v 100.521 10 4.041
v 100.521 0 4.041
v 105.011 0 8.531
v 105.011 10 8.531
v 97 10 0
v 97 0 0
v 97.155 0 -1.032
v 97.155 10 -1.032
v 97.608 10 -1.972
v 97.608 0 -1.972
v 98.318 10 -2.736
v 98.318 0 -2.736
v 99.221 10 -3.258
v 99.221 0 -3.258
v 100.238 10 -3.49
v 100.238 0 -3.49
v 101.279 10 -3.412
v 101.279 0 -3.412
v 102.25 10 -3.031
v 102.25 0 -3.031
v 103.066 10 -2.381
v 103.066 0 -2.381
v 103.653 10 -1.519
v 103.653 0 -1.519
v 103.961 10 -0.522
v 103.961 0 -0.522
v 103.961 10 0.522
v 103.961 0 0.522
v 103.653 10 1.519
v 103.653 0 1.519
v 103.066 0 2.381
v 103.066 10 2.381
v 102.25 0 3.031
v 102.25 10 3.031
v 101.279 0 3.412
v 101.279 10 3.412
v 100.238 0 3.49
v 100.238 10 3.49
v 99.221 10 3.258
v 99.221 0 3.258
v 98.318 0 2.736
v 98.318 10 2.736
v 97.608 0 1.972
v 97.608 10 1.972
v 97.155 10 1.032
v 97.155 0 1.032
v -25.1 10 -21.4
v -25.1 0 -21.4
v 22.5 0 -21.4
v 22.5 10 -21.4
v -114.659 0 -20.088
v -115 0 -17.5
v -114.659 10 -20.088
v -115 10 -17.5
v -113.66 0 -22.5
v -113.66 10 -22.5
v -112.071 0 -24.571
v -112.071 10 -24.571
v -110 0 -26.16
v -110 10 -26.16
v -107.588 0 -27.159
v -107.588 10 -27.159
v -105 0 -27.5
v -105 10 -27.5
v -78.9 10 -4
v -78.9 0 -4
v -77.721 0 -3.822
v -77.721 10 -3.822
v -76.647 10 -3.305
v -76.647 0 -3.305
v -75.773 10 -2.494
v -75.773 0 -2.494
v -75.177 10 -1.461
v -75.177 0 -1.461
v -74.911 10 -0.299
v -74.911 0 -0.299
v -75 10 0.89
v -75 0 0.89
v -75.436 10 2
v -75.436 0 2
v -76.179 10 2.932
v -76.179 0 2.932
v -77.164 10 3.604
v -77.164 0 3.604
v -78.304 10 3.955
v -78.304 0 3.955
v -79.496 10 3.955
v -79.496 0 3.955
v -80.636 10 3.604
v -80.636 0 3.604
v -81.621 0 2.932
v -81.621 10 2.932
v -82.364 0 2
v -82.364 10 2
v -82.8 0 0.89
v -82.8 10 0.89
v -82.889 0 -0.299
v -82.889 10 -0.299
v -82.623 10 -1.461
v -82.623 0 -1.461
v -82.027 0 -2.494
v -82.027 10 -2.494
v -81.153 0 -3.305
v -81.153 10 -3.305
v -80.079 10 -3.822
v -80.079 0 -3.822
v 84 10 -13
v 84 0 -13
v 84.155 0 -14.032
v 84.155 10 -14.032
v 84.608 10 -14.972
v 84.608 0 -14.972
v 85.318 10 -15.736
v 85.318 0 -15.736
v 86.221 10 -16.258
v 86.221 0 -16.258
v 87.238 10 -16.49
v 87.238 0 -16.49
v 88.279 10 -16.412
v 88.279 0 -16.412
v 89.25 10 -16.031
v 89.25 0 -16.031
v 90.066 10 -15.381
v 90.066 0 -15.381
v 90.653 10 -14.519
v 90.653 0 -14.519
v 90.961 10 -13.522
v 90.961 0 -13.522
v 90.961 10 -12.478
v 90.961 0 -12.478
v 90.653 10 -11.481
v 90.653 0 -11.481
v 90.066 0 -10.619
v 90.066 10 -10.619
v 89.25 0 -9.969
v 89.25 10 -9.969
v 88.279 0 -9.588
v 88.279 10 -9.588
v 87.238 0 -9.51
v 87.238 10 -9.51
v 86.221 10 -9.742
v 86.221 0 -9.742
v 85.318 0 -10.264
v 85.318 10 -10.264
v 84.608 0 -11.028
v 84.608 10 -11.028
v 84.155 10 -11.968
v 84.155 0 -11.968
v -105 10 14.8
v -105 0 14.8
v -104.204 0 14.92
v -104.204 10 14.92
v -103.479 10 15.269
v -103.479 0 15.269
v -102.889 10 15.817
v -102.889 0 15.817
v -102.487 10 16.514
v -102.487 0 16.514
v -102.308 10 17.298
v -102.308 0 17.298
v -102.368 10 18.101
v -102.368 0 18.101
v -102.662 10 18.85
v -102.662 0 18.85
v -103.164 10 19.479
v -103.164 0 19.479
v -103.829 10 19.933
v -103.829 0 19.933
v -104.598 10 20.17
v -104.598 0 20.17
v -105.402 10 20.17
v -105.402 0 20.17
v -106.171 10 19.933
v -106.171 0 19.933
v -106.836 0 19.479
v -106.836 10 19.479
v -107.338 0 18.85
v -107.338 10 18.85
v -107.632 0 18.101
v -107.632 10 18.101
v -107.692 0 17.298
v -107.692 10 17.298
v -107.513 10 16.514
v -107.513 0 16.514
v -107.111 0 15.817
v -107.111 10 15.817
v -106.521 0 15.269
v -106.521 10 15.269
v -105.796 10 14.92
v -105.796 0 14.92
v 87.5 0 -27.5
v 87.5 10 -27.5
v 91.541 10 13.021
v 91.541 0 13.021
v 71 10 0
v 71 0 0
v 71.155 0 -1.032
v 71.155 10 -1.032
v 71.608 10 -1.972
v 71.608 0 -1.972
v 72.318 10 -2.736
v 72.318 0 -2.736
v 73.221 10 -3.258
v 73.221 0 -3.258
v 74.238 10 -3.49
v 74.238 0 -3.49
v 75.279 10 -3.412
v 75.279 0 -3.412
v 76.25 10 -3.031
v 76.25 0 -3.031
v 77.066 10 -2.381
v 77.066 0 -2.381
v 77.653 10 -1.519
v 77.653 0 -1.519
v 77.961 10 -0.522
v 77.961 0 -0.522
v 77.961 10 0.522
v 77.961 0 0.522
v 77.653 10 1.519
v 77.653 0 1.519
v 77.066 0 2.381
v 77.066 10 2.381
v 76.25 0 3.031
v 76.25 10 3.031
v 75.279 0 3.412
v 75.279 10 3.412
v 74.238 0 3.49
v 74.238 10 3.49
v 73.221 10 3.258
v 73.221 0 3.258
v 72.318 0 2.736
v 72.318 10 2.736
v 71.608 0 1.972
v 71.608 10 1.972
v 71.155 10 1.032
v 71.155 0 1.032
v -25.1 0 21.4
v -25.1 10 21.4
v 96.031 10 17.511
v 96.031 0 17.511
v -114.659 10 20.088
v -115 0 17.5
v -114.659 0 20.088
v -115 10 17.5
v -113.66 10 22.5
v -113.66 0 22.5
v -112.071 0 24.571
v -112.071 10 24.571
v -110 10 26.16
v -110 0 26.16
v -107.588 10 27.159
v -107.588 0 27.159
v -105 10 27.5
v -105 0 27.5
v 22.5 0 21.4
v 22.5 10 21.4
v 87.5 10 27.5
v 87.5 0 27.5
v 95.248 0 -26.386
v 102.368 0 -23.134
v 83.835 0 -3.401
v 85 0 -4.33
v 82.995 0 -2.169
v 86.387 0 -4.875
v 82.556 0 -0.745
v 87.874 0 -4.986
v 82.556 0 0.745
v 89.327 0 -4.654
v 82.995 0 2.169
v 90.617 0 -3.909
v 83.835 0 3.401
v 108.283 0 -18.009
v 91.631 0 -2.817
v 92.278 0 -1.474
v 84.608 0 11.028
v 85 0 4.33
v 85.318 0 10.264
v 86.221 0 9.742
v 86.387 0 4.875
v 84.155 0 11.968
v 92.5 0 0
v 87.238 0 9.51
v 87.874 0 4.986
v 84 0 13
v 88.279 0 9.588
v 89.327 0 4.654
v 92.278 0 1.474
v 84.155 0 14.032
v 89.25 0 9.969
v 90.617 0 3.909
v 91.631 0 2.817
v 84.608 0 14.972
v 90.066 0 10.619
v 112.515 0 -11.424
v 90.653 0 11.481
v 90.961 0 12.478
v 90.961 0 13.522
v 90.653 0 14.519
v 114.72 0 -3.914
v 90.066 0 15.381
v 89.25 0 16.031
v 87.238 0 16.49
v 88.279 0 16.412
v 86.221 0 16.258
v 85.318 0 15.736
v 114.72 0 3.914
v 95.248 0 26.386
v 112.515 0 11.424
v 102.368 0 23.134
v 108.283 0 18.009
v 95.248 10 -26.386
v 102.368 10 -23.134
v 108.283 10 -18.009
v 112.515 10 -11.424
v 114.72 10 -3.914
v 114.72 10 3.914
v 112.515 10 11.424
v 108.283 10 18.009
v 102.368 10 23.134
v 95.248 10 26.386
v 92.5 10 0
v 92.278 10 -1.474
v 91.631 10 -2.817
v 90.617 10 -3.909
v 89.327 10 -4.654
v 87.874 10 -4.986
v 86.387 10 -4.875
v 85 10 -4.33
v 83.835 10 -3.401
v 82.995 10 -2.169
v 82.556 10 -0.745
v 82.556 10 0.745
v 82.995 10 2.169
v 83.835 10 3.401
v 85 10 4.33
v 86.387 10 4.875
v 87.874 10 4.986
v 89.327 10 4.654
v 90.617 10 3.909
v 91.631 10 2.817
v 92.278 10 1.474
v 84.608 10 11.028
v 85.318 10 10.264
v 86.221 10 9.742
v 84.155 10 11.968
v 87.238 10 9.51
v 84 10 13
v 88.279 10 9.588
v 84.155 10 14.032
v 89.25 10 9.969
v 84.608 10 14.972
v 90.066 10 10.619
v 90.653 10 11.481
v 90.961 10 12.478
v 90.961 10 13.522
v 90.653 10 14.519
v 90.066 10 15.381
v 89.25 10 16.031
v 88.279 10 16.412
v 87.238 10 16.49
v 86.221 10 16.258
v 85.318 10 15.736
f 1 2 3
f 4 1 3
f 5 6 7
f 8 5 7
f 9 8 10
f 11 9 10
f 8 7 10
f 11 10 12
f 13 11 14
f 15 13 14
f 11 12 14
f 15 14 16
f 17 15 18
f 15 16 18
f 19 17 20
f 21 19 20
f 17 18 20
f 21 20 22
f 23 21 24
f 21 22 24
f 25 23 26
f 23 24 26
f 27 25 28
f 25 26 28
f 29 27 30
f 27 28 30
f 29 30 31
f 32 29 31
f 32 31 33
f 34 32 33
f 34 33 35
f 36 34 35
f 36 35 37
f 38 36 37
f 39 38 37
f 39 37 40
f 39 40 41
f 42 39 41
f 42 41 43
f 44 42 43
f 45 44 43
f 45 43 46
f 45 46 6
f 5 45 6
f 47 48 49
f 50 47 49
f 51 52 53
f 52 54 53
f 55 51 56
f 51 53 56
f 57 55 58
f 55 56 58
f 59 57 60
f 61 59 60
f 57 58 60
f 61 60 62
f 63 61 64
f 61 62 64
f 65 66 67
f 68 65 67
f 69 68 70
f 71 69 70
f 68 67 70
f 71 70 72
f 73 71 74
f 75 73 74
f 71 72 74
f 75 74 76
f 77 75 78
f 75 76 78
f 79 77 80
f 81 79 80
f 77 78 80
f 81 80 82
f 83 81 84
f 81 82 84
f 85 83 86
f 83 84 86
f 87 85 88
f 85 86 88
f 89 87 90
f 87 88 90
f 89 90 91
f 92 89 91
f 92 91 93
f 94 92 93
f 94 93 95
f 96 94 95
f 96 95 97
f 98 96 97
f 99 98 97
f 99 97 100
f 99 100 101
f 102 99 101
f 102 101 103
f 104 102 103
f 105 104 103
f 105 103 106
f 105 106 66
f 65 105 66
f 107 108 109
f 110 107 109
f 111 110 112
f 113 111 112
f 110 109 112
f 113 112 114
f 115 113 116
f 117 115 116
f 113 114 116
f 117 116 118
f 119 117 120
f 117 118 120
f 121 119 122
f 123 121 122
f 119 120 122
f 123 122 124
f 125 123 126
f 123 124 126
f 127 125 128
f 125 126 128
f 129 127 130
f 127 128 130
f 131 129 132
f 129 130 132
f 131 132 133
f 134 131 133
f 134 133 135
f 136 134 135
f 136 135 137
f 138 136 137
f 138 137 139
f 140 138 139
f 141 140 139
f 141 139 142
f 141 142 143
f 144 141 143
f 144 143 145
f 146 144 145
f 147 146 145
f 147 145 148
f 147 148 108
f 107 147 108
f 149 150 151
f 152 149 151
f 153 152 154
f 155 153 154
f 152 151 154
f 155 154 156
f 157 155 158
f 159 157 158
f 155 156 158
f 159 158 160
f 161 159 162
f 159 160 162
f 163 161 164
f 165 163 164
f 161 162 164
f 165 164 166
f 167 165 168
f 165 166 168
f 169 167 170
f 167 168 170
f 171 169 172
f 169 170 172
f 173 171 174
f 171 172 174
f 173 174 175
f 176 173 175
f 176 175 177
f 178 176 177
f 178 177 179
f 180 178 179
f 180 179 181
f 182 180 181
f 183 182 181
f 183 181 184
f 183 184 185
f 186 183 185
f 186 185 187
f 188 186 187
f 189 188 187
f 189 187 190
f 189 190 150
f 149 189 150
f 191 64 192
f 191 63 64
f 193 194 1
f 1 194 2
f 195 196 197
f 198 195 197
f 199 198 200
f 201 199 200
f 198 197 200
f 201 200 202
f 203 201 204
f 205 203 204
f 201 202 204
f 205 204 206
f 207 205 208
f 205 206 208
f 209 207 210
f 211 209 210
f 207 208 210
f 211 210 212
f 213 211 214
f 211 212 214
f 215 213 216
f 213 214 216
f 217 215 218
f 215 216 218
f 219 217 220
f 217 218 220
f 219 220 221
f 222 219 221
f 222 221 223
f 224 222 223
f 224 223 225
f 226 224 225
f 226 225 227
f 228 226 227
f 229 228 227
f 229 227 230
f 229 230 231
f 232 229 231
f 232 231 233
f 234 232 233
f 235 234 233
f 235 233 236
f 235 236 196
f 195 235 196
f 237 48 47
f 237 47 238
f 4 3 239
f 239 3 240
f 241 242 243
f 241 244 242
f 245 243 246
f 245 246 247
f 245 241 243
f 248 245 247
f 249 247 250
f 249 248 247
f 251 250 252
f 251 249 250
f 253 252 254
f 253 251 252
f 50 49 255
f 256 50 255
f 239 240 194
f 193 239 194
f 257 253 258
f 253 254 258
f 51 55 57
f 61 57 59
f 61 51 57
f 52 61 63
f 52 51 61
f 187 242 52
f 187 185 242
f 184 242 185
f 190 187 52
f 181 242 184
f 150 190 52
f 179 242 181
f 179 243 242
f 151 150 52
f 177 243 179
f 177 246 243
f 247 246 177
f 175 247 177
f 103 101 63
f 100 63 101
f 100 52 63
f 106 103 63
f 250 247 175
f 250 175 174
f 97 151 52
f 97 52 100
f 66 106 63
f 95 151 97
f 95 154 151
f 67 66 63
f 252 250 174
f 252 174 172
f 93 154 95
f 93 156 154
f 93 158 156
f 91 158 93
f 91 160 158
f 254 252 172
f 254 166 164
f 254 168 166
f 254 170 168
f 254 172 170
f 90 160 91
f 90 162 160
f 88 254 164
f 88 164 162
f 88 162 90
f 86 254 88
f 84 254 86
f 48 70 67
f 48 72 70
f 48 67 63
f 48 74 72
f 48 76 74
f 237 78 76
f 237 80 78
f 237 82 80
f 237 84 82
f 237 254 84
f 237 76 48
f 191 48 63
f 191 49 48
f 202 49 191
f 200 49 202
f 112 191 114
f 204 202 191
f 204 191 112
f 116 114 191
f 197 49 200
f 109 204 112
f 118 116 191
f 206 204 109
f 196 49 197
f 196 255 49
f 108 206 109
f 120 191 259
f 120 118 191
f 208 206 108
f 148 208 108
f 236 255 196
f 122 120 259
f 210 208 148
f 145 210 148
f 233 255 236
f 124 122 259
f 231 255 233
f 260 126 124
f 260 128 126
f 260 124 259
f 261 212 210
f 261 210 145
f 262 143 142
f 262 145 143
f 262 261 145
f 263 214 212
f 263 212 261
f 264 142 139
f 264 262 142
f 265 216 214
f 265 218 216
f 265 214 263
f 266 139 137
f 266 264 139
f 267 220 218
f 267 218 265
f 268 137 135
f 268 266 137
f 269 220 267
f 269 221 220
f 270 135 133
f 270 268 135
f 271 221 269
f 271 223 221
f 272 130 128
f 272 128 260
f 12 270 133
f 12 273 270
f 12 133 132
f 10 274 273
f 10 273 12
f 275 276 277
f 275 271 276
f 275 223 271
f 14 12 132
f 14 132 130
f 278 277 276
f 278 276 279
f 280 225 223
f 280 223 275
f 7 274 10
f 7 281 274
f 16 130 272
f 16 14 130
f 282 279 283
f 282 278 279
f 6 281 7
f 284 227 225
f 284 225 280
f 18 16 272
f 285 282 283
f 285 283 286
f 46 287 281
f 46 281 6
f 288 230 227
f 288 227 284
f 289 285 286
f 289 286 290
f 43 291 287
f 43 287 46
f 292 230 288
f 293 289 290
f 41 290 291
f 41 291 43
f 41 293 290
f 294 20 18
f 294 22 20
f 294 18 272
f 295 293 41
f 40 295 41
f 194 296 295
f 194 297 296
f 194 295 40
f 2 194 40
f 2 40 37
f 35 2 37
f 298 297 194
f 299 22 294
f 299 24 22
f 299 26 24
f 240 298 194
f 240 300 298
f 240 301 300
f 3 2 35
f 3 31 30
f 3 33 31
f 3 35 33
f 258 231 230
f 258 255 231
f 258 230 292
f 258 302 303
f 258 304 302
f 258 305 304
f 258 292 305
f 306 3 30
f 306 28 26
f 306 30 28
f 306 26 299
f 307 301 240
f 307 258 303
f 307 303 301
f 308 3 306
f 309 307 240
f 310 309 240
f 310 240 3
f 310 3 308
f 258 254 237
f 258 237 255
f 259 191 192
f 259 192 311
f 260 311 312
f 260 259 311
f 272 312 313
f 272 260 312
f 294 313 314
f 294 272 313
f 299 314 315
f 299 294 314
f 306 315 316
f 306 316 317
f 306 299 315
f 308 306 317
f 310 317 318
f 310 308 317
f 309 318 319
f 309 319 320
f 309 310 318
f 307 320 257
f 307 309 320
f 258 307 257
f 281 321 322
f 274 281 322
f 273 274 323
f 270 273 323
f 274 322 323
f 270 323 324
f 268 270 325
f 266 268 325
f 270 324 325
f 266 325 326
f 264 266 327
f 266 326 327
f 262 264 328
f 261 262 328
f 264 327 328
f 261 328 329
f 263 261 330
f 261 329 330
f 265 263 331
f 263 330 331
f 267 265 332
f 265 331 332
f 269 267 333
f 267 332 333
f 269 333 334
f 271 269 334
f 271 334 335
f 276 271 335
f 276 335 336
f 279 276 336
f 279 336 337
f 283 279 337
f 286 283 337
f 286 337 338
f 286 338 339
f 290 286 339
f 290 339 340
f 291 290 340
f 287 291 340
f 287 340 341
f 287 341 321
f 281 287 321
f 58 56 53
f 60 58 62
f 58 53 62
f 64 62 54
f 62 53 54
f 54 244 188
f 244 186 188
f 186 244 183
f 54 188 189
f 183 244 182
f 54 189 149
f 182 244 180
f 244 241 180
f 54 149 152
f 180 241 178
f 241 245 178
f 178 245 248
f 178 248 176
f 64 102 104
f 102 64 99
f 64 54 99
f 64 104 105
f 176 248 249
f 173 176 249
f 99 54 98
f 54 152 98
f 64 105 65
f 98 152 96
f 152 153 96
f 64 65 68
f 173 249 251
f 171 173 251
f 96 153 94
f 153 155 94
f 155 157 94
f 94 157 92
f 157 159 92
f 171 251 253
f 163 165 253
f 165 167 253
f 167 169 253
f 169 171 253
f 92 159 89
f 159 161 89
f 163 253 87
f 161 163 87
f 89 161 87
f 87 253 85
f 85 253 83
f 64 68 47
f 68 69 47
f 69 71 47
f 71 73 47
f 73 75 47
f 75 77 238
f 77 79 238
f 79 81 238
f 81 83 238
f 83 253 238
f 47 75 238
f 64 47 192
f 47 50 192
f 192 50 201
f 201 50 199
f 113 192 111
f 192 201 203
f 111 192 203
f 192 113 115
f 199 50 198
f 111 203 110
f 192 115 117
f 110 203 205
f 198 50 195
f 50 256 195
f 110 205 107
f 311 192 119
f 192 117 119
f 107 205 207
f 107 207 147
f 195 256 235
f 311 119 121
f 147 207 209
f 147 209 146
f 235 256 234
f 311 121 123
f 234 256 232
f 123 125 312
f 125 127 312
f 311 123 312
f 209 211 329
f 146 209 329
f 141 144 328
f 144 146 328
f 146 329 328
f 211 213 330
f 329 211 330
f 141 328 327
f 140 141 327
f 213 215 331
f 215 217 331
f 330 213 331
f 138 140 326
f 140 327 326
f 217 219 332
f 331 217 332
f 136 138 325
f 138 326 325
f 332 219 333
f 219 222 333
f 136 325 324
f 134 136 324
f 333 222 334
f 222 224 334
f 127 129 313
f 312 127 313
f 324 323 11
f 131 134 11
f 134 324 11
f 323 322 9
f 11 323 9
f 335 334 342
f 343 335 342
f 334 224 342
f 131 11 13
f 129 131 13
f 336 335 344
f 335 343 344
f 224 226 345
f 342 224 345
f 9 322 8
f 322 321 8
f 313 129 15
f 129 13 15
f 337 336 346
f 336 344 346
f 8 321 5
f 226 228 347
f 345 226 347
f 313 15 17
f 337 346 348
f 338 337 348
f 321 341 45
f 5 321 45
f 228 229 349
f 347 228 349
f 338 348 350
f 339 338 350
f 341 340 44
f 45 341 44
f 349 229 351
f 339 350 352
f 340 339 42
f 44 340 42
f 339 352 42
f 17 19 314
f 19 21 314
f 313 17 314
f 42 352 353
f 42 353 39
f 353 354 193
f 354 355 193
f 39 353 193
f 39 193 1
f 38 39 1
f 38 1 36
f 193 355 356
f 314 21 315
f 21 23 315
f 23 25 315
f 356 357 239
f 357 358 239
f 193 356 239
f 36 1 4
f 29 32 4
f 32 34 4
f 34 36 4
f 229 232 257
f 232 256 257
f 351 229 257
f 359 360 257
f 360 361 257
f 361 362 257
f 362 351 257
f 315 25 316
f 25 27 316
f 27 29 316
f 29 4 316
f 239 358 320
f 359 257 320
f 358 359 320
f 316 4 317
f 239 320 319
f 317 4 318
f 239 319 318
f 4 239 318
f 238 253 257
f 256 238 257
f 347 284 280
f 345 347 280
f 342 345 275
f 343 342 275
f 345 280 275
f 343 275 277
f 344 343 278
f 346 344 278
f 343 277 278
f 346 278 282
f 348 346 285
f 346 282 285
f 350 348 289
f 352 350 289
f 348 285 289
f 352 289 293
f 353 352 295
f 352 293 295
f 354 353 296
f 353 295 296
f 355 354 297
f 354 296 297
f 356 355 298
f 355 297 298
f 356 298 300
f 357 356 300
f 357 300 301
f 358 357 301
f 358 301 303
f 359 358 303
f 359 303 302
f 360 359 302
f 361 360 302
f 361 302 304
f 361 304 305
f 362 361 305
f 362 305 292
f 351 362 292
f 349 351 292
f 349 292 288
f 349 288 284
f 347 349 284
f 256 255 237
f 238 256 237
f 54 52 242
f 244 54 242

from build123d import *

# Parameters (mm, degrees)
SKETCH1_W            = 175
SKETCH1_H            = 55
BOSS_EXTRUDE1_DEPTH  = 10
SKETCH2_W            = 27.5
SKETCH2_H            = 55
BOSS_EXTRUDE2_DEPTH  = 10
M8_CLEARANCE_HOLE1_D = 10
M6_CLEARANCE_HOLE1_D = 7
FILLET1_R            = 10
SKETCH11_W           = 42.4
SKETCH11_H           = 42.4
CUT_EXTRUDE3_DEPTH   = 119.664442863
SKETCH12_R           = 4
CUT_EXTRUDE4_DEPTH   = 119.664442863
SKETCH13_W           = 5
SKETCH13_H           = 42.4
CUT_EXTRUDE5_DEPTH   = 119.664442863
CUT_EXTRUDE6_DEPTH   = 12.7
SKETCH16_R           = 2.7
CUT_EXTRUDE8_DEPTH   = 119.664442863


with BuildPart() as part:
    # Sketch1 → Boss-Extrude1 (new body)
    with BuildSketch(Plane(origin=(0, 0, 0), x_dir=(1, 0, 0), z_dir=(0, 1, 0))):
        Rectangle(SKETCH1_W, SKETCH1_H)
    extrude(amount=BOSS_EXTRUDE1_DEPTH)

    # Sketch2 → Boss-Extrude2 (add)
    with BuildSketch(Plane.XZ):
        with Locations((-101.25, 0)):
            Rectangle(SKETCH2_W, SKETCH2_H)
        with BuildLine():
            Line((87.5, 27.5), (87.5, -27.5))
            ThreePointArc((87.5, -27.5), (115, 0), (87.5, 27.5))
        make_face()
    extrude(amount=-BOSS_EXTRUDE2_DEPTH)

    # M8 Clearance Hole1 (through all)
    with Locations(Plane(origin=(0, 0, 0), x_dir=(-1, 0, 0), z_dir=(0, -1, 0))):
        with Locations((-87.5, 0)):
            Hole(M8_CLEARANCE_HOLE1_D / 2)

    # M6 Clearance Hole1 (through all)
    with Locations(Plane(origin=(0, 10, 0), x_dir=(1, 0, 0), z_dir=(0, 1, 0))):
        with Locations((87.5, 13), (74.5, 0), (100.5, 0), (87.5, -13)):
            Hole(M6_CLEARANCE_HOLE1_D / 2)

    # Fillet1
    fillet1_edges = [part.edges().sort_by_distance(p)[0] for p in [
        (-115, 5, -27.5),
        (-115, 5, 27.5),
    ]]
    fillet(fillet1_edges, radius=FILLET1_R)

    # Sketch11 → Cut-Extrude3 (cut, through all)
    with BuildSketch(Plane.XZ):
        with Locations((-3.7, 0)):
            Rectangle(SKETCH11_W, SKETCH11_H)
    extrude(amount=-CUT_EXTRUDE3_DEPTH, mode=Mode.SUBTRACT)

    # Sketch12 → Cut-Extrude4 (cut, through all)
    with BuildSketch(Plane.XZ):
        with Locations(Location((-78.9, 0, 0), (0, 0, 270))):
            Circle(SKETCH12_R)
    extrude(amount=-CUT_EXTRUDE4_DEPTH, mode=Mode.SUBTRACT)

    # Sketch13 → Cut-Extrude5 (cut, through all)
    with BuildSketch(Plane.XZ):
        Polygon((-25.1, -21.4), (-25.1, 21.4), (-24.9, 21.4), (-24.9, 21.2), (-24.9, -21.2), (-24.9, -21.4), align=None)
        Polygon((17.5, 21.2), (22.5, 21.2), (22.5, 21.4), (-24.9, 21.4), (-24.9, 21.2), align=None)
        with Locations((20, 0)):
            Rectangle(SKETCH13_W, SKETCH13_H)
        Polygon((-24.9, -21.2), (-24.9, -21.4), (22.5, -21.4), (22.5, -21.2), (17.5, -21.2), align=None)
    extrude(amount=-CUT_EXTRUDE5_DEPTH, mode=Mode.SUBTRACT)

    # Sketch14 → Cut-Extrude6 (cut)
    with BuildSketch(Plane.XZ):
        Polygon((91.541115254, 13.021371376), (100.521371376, 4.041115254), (105.011499436, 8.531243315), (96.031243315, 17.511499436), align=None)
    extrude(amount=-CUT_EXTRUDE6_DEPTH, mode=Mode.SUBTRACT)

    # Sketch16 → Cut-Extrude8 (cut, through all)
    with BuildSketch(Plane.XZ):
        with Locations(Location((-105, 17.5, 0), (0, 0, 270))):
            Circle(SKETCH16_R)
    extrude(amount=-CUT_EXTRUDE8_DEPTH, mode=Mode.SUBTRACT)


solid = part.part
